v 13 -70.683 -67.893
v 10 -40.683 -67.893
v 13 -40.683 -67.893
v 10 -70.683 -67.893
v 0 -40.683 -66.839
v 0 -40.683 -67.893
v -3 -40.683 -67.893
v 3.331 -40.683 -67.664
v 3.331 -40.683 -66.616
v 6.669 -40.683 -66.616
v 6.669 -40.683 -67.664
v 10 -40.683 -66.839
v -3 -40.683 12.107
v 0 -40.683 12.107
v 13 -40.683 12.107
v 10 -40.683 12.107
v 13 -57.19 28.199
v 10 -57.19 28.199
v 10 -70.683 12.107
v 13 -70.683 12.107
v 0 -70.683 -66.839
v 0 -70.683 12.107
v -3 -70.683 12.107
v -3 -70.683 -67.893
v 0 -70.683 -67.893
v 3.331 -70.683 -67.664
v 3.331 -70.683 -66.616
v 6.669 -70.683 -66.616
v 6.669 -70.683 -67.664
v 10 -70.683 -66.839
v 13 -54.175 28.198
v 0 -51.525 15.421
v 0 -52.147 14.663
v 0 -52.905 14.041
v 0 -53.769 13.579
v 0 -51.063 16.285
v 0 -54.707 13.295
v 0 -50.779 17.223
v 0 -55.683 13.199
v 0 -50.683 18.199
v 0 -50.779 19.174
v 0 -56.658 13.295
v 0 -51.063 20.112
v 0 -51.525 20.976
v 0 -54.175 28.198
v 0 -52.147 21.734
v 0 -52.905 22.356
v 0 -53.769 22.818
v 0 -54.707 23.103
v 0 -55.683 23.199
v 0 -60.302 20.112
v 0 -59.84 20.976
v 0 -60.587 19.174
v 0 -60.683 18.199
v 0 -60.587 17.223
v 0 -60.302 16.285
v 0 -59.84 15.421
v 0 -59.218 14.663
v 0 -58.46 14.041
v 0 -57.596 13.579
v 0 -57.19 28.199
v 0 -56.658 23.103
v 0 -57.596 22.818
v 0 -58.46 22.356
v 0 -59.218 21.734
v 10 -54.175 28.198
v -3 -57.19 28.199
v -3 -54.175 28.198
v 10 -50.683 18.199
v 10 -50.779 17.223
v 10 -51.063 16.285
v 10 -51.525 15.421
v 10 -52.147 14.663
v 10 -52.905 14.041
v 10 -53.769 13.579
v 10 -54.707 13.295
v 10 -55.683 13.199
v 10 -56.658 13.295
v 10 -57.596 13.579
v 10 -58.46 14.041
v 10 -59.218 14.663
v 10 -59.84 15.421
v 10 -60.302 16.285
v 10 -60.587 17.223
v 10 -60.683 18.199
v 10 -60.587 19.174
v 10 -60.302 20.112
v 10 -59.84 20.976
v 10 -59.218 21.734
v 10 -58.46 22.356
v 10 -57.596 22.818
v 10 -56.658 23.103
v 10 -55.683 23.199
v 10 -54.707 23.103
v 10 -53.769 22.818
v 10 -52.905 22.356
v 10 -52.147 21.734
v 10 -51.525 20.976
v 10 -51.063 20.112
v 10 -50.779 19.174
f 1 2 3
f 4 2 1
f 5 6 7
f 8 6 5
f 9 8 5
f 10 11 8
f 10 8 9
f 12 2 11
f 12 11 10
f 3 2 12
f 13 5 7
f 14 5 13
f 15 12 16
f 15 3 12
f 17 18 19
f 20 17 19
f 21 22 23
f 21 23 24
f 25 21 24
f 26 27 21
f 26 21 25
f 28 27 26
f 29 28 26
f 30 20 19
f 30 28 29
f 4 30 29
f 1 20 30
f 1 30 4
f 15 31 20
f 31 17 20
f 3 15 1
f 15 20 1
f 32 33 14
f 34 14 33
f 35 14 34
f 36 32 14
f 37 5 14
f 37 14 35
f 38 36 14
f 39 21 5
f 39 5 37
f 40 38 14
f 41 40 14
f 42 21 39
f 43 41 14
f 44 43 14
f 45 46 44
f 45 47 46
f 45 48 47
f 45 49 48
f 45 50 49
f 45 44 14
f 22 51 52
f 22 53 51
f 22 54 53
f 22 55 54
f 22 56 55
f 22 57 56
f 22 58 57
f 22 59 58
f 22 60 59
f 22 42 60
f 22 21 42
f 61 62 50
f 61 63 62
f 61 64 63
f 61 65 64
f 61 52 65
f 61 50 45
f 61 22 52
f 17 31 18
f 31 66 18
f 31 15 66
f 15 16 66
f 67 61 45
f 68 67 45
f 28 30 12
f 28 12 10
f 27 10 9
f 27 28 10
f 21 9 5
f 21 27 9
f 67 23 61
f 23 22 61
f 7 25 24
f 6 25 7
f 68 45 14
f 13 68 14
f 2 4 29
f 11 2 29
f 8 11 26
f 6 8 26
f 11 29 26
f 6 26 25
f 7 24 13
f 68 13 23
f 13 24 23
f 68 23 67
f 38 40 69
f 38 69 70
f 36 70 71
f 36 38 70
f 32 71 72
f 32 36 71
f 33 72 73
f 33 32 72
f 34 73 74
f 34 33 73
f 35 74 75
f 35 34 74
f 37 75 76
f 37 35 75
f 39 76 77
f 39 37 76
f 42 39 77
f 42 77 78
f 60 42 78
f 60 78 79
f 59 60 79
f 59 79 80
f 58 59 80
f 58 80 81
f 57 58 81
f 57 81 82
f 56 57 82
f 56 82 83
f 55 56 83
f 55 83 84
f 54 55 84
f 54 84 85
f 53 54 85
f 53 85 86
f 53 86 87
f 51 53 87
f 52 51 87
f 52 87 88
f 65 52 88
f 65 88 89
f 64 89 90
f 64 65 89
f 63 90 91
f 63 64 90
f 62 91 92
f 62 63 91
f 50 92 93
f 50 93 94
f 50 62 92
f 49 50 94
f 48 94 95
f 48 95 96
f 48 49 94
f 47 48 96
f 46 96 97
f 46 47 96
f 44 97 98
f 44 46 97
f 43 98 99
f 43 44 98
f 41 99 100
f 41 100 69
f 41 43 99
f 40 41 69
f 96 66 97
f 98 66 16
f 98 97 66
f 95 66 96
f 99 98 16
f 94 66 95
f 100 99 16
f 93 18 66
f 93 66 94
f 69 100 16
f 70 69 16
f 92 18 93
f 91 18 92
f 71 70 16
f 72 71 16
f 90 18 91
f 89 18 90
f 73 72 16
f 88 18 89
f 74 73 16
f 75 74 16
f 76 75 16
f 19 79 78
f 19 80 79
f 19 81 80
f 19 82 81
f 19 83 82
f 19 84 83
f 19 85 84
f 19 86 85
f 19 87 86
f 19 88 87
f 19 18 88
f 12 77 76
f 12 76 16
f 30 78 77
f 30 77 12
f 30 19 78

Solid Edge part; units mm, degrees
sketch "Sketch1" plane through (0, 0, 0) normal (1, 0, 0) x (0, 1, 0)
  line L0 (-70.6829, -67.8929) -> (-40.6829, -67.8929)
  line L1 (-40.6829, -67.8929) -> (-40.6829, 12.1071)
  line L2 (-40.6829, 12.1071) -> (-70.6829, 12.1071)
  line L3 (-70.6829, 12.1071) -> (-70.6829, -67.8929)
  line L4 (-70.6829, 12.1071) -> (-40.6829, 12.1071)
  line L5 (-54.1753, 28.1984) -> (-40.6829, 12.1071)
  line L6 (-57.1901, 28.1988) -> (-54.1753, 28.1984)
  line L7 (-70.6829, 12.1071) -> (-57.1901, 28.1988)
  dimension "D1" = 30
  dimension "D2" = 20.9994
  dimension "D3" = 21
  dimension "D4" = 80
  dimension "D5" = 30
extrude "Protrusion1" add sketch "Sketch1" against normal blind 3
sketch "Sketch2" plane through (0, -21.8205, 20.1807) normal (1, 0, 0) x (0, 1, 0)
  circle A0 centre (-33.8621, -1.9821) radius 5
  dimension "D1" = 10
extrude "ExtrudedProtrusion_2" add sketch "Sketch2" along normal blind 11
mirror "Mirror1" about plane through (5, -21.8205, 20.1506) normal (1, 0, 0) of "Protrusion1"
sketch "Sketch3" plane through (11.5, -70.6829, -27.8929) normal (0, -1, 0) x (0, 0, -1)
  arc A0 (40, -1.5) -> (40, -11.5) centre (88.482, -6.5) ccw
  line L0 (38.9458, -1.5) -> (40, -1.5)
  arc A1 (38.9458, -1.5) -> (38.9458, -11.5) centre (88.6952, -6.5) ccw
  line L1 (40, -11.5) -> (38.9458, -11.5)
extrude "ExtrudedProtrusion_4" add sketch "Sketch3" against normal blind 30
